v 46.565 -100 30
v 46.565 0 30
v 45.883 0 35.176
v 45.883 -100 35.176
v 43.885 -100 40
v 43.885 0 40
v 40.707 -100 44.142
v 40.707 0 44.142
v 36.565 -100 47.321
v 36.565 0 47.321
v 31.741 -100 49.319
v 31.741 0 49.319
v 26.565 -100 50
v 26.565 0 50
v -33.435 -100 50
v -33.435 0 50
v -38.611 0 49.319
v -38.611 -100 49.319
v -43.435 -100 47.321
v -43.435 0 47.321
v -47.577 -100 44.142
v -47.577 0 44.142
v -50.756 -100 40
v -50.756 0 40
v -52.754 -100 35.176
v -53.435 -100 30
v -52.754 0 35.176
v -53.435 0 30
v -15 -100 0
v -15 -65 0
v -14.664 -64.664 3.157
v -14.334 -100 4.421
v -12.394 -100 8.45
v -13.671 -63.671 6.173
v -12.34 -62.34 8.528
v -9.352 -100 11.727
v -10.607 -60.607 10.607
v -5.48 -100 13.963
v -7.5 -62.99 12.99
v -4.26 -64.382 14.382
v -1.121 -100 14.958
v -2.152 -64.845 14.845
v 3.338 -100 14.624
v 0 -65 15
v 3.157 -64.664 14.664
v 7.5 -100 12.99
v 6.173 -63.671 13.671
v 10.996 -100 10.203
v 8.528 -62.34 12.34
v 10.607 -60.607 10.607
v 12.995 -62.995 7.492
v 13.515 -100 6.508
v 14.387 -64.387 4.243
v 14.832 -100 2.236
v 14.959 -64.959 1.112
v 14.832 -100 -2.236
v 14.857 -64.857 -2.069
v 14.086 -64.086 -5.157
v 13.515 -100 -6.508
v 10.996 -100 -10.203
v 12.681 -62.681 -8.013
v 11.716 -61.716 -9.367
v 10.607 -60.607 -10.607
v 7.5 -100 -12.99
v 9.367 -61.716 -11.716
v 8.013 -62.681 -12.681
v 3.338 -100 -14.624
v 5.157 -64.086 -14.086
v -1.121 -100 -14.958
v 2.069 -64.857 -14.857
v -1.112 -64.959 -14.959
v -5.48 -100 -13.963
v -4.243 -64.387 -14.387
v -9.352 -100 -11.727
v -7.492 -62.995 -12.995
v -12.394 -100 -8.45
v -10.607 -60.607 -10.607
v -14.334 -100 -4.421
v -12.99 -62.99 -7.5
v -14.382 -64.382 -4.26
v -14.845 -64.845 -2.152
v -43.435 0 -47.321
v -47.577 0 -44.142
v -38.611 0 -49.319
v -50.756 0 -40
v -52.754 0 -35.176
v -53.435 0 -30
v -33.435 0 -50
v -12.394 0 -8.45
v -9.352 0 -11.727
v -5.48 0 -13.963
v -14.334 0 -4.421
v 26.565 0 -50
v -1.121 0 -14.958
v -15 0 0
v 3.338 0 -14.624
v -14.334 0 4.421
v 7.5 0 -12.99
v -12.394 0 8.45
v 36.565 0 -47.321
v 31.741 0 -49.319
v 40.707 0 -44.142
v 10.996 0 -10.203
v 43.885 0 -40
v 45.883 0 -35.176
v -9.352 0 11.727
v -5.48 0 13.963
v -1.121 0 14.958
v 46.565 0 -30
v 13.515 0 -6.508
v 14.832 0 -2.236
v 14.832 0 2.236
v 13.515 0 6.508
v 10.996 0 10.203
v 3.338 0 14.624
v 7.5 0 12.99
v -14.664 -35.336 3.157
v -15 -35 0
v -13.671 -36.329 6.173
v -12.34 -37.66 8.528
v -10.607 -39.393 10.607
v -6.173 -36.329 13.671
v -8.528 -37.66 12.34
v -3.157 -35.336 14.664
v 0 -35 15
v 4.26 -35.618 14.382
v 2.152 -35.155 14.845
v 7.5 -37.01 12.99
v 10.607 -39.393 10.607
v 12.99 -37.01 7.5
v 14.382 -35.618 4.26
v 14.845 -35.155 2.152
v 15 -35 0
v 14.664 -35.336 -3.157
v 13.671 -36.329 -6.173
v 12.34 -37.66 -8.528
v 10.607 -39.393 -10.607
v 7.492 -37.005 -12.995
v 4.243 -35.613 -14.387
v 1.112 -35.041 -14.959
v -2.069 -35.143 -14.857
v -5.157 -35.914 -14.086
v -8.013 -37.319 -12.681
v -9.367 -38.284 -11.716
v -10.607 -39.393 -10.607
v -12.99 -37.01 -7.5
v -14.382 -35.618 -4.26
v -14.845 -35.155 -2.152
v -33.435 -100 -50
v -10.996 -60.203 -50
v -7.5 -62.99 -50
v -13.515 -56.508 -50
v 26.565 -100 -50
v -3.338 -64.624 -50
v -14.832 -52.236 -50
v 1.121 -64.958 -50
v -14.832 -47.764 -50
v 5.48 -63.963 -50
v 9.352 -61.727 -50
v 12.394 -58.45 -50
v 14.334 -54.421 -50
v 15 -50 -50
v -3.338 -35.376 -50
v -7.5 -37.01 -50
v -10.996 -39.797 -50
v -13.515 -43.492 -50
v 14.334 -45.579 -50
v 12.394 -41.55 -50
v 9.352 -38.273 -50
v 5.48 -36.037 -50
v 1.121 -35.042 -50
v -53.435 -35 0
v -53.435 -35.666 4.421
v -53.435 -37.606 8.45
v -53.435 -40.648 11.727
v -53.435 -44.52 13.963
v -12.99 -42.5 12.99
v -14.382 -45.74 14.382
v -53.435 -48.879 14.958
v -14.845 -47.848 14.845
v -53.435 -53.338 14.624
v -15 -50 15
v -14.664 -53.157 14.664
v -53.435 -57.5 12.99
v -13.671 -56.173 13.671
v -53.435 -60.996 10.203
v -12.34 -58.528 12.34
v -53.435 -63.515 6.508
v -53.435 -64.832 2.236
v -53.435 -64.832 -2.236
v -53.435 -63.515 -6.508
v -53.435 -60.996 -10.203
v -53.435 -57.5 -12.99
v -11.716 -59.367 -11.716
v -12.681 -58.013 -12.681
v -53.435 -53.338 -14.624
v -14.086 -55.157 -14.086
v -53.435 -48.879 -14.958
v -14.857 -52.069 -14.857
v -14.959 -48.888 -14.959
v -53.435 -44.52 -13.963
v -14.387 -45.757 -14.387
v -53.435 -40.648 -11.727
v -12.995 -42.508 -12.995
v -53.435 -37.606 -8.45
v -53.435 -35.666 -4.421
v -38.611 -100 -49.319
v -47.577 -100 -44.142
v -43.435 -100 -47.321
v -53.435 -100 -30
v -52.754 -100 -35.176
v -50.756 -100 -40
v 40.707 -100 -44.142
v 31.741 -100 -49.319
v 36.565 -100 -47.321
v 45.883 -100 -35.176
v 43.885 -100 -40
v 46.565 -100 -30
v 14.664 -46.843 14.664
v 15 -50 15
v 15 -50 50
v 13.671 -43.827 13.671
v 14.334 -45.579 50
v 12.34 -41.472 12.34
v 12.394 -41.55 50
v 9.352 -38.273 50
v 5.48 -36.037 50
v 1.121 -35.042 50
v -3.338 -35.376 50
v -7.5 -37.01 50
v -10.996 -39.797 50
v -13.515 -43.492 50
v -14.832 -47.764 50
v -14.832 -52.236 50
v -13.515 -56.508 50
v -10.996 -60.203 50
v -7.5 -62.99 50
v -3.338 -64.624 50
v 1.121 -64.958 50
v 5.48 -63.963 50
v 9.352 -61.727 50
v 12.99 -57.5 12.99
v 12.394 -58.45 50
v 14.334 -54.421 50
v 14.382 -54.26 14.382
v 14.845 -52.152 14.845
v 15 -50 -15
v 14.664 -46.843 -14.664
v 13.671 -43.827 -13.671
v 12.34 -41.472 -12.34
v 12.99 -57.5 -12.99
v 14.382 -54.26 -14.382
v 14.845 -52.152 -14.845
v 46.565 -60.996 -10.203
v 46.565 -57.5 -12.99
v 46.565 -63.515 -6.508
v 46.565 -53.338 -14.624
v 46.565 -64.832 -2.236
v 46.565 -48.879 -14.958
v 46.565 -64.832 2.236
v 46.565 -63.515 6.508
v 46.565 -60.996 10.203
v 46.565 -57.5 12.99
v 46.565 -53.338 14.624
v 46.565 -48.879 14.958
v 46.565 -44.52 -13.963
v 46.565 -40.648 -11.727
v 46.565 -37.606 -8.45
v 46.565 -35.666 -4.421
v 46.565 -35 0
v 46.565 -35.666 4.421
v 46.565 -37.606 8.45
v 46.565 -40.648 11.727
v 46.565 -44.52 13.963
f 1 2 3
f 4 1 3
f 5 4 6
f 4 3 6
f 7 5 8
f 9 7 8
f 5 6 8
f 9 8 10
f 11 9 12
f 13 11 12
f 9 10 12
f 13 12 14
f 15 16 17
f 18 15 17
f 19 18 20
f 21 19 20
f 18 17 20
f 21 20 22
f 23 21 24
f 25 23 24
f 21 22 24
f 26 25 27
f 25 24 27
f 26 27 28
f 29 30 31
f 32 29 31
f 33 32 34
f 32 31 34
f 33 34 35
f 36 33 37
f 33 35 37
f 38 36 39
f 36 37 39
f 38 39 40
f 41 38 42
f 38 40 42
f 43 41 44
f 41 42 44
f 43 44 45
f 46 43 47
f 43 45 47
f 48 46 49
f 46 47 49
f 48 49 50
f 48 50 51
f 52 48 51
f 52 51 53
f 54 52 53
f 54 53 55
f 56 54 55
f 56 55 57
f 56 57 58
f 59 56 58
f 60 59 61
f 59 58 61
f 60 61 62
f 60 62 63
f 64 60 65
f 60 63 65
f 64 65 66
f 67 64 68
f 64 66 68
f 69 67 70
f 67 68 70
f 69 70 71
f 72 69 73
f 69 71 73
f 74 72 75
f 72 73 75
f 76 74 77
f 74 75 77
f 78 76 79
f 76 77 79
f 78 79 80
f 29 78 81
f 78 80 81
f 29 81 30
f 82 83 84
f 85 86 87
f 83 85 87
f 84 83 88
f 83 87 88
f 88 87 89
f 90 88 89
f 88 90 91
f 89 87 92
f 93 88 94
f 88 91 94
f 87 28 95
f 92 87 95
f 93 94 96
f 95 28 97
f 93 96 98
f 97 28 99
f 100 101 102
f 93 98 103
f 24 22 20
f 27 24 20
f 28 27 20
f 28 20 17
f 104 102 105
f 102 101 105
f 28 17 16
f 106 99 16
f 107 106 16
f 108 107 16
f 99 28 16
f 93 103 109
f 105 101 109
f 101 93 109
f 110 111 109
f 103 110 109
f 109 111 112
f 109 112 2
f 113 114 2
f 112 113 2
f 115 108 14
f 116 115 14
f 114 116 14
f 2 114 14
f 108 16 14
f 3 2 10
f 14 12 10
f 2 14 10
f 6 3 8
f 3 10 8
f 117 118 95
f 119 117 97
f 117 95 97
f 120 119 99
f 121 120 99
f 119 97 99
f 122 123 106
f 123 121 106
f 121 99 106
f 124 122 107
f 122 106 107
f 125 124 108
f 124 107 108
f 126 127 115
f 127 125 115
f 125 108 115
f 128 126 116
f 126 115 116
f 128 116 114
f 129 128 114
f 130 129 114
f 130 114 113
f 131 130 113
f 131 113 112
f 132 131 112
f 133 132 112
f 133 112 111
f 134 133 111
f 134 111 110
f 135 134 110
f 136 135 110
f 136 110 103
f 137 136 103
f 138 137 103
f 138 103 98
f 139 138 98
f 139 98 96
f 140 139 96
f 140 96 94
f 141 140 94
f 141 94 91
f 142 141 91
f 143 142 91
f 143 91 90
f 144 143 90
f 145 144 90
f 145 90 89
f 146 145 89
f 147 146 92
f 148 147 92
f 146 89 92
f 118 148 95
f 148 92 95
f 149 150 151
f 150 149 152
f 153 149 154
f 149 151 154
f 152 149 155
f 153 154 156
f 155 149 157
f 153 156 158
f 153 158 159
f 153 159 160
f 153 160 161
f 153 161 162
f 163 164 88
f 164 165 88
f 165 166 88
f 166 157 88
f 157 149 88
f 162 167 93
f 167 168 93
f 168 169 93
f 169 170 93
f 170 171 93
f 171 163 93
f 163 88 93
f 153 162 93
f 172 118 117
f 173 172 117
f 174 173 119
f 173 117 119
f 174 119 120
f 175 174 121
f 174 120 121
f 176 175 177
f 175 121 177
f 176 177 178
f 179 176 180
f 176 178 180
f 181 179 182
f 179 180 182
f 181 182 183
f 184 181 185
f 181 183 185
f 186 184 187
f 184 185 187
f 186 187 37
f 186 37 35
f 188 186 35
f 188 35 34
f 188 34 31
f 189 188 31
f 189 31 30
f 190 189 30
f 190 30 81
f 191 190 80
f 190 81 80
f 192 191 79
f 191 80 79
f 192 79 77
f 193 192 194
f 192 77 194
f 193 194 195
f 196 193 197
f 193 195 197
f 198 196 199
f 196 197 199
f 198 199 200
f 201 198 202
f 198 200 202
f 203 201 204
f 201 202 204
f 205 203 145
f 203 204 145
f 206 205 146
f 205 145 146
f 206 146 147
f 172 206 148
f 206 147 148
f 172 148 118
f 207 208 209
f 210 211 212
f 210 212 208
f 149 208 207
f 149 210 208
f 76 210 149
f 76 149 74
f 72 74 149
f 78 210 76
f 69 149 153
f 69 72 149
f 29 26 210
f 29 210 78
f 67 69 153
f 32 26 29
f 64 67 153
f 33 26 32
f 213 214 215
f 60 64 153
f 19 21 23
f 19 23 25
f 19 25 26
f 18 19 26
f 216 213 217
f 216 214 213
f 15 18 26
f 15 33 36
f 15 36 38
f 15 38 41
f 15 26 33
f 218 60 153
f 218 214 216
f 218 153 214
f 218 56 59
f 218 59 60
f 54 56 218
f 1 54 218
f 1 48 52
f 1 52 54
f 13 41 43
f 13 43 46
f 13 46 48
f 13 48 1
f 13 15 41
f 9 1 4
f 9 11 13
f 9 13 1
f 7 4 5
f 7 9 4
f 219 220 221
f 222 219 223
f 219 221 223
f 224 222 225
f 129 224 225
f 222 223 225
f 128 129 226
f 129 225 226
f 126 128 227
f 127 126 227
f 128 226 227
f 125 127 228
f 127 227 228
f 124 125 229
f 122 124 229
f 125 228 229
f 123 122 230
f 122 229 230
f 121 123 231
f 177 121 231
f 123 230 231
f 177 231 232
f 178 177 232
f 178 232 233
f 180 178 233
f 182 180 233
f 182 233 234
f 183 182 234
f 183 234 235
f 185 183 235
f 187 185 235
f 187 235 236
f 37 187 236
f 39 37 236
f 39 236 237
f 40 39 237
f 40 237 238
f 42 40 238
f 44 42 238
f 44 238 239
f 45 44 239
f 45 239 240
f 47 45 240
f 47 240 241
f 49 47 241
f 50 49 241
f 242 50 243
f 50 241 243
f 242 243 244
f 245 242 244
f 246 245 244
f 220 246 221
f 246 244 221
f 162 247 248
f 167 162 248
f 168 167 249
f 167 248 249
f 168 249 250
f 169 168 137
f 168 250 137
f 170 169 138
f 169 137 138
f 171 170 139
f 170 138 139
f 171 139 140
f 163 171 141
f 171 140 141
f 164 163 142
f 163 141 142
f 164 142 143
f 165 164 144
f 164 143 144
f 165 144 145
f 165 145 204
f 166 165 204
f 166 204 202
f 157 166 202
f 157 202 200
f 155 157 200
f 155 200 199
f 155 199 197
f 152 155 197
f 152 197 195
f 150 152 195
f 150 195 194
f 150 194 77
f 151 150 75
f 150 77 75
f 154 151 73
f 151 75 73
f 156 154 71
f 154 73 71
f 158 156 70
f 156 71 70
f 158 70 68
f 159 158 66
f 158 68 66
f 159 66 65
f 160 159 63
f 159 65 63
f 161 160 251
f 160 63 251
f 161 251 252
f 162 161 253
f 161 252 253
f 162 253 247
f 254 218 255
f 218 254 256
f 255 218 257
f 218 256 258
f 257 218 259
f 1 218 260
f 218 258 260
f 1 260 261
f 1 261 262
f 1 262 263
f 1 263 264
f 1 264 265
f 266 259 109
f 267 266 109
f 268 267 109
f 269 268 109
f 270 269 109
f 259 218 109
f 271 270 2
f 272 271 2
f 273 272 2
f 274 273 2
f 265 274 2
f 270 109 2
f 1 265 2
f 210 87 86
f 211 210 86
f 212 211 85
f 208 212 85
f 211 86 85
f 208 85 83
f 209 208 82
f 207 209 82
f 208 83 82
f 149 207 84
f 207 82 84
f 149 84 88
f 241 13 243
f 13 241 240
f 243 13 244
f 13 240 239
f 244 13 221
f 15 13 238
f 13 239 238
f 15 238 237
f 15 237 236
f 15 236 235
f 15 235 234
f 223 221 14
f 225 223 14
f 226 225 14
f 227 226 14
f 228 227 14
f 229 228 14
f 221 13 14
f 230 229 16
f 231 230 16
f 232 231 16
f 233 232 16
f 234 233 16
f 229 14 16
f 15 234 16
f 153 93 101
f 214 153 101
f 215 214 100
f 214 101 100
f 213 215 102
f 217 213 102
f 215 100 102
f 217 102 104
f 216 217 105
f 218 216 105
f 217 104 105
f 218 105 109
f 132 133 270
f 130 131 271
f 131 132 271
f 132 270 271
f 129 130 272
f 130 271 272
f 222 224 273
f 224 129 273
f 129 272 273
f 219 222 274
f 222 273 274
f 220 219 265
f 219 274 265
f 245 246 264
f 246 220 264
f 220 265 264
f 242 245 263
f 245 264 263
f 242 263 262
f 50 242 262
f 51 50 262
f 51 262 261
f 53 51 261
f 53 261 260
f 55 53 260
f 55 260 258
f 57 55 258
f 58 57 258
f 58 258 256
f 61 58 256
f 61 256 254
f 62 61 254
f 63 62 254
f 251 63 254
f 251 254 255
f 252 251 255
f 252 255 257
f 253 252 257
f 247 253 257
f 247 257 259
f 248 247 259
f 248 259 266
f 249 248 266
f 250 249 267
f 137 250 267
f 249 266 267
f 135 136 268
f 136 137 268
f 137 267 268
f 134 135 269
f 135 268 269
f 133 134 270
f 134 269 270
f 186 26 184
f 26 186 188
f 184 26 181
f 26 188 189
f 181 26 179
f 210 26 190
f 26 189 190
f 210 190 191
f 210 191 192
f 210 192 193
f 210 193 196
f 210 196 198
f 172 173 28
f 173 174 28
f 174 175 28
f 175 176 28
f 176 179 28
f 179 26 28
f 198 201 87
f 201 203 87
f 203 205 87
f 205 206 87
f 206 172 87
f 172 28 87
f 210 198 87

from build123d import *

# Parameters (mm, degrees)
F1_DEPTH = 100
F2_R     = 15
F3_DEPTH = 100.001
F4_R     = 15
F5_DEPTH = 100.001
F6_R     = 15
F7_DEPTH = 100.001


with BuildPart() as f1:
    # F0 (on Front) → F1 (new body)
    with BuildSketch(Plane.XZ):
        with BuildLine():
            ThreePointArc((46.564883, 30), (40.707019, 44.142136), (26.564883, 50))
            Line((26.564883, 50), (-33.435117, 50))
            ThreePointArc((-33.435117, 50), (-47.577252, 44.142136), (-53.435117, 30))
            Line((-53.435117, 30), (-53.435117, -30))
            ThreePointArc((-53.435117, -30), (-47.577252, -44.142136), (-33.435117, -50))
            Line((-33.435117, -50), (26.564883, -50))
            ThreePointArc((26.564883, -50), (40.707019, -44.142136), (46.564883, -30))
            Line((46.564883, -30), (46.564883, 30))
        make_face()
    extrude(amount=F1_DEPTH)

    # F2 (on face) → F3 (cut, through all)
    with BuildSketch(Plane.XY.offset(50)):
        with Locations((0, -50)):
            Circle(F2_R)
    extrude(amount=-F3_DEPTH, mode=Mode.SUBTRACT)

    # F4 (on face) → F5 (cut, through all)
    with BuildSketch(Plane(origin=(0, 0, 0), x_dir=(-1, 0, 0), z_dir=(0, 1, 0))):
        Circle(F4_R)
    extrude(amount=-F5_DEPTH, mode=Mode.SUBTRACT)

    # F6 (on face) → F7 (cut, through all)
    with BuildSketch(Plane.YZ.offset(46.564883)):
        with Locations((-50, 0)):
            Circle(F6_R)
    extrude(amount=-F7_DEPTH, mode=Mode.SUBTRACT)


solid = f1.part
